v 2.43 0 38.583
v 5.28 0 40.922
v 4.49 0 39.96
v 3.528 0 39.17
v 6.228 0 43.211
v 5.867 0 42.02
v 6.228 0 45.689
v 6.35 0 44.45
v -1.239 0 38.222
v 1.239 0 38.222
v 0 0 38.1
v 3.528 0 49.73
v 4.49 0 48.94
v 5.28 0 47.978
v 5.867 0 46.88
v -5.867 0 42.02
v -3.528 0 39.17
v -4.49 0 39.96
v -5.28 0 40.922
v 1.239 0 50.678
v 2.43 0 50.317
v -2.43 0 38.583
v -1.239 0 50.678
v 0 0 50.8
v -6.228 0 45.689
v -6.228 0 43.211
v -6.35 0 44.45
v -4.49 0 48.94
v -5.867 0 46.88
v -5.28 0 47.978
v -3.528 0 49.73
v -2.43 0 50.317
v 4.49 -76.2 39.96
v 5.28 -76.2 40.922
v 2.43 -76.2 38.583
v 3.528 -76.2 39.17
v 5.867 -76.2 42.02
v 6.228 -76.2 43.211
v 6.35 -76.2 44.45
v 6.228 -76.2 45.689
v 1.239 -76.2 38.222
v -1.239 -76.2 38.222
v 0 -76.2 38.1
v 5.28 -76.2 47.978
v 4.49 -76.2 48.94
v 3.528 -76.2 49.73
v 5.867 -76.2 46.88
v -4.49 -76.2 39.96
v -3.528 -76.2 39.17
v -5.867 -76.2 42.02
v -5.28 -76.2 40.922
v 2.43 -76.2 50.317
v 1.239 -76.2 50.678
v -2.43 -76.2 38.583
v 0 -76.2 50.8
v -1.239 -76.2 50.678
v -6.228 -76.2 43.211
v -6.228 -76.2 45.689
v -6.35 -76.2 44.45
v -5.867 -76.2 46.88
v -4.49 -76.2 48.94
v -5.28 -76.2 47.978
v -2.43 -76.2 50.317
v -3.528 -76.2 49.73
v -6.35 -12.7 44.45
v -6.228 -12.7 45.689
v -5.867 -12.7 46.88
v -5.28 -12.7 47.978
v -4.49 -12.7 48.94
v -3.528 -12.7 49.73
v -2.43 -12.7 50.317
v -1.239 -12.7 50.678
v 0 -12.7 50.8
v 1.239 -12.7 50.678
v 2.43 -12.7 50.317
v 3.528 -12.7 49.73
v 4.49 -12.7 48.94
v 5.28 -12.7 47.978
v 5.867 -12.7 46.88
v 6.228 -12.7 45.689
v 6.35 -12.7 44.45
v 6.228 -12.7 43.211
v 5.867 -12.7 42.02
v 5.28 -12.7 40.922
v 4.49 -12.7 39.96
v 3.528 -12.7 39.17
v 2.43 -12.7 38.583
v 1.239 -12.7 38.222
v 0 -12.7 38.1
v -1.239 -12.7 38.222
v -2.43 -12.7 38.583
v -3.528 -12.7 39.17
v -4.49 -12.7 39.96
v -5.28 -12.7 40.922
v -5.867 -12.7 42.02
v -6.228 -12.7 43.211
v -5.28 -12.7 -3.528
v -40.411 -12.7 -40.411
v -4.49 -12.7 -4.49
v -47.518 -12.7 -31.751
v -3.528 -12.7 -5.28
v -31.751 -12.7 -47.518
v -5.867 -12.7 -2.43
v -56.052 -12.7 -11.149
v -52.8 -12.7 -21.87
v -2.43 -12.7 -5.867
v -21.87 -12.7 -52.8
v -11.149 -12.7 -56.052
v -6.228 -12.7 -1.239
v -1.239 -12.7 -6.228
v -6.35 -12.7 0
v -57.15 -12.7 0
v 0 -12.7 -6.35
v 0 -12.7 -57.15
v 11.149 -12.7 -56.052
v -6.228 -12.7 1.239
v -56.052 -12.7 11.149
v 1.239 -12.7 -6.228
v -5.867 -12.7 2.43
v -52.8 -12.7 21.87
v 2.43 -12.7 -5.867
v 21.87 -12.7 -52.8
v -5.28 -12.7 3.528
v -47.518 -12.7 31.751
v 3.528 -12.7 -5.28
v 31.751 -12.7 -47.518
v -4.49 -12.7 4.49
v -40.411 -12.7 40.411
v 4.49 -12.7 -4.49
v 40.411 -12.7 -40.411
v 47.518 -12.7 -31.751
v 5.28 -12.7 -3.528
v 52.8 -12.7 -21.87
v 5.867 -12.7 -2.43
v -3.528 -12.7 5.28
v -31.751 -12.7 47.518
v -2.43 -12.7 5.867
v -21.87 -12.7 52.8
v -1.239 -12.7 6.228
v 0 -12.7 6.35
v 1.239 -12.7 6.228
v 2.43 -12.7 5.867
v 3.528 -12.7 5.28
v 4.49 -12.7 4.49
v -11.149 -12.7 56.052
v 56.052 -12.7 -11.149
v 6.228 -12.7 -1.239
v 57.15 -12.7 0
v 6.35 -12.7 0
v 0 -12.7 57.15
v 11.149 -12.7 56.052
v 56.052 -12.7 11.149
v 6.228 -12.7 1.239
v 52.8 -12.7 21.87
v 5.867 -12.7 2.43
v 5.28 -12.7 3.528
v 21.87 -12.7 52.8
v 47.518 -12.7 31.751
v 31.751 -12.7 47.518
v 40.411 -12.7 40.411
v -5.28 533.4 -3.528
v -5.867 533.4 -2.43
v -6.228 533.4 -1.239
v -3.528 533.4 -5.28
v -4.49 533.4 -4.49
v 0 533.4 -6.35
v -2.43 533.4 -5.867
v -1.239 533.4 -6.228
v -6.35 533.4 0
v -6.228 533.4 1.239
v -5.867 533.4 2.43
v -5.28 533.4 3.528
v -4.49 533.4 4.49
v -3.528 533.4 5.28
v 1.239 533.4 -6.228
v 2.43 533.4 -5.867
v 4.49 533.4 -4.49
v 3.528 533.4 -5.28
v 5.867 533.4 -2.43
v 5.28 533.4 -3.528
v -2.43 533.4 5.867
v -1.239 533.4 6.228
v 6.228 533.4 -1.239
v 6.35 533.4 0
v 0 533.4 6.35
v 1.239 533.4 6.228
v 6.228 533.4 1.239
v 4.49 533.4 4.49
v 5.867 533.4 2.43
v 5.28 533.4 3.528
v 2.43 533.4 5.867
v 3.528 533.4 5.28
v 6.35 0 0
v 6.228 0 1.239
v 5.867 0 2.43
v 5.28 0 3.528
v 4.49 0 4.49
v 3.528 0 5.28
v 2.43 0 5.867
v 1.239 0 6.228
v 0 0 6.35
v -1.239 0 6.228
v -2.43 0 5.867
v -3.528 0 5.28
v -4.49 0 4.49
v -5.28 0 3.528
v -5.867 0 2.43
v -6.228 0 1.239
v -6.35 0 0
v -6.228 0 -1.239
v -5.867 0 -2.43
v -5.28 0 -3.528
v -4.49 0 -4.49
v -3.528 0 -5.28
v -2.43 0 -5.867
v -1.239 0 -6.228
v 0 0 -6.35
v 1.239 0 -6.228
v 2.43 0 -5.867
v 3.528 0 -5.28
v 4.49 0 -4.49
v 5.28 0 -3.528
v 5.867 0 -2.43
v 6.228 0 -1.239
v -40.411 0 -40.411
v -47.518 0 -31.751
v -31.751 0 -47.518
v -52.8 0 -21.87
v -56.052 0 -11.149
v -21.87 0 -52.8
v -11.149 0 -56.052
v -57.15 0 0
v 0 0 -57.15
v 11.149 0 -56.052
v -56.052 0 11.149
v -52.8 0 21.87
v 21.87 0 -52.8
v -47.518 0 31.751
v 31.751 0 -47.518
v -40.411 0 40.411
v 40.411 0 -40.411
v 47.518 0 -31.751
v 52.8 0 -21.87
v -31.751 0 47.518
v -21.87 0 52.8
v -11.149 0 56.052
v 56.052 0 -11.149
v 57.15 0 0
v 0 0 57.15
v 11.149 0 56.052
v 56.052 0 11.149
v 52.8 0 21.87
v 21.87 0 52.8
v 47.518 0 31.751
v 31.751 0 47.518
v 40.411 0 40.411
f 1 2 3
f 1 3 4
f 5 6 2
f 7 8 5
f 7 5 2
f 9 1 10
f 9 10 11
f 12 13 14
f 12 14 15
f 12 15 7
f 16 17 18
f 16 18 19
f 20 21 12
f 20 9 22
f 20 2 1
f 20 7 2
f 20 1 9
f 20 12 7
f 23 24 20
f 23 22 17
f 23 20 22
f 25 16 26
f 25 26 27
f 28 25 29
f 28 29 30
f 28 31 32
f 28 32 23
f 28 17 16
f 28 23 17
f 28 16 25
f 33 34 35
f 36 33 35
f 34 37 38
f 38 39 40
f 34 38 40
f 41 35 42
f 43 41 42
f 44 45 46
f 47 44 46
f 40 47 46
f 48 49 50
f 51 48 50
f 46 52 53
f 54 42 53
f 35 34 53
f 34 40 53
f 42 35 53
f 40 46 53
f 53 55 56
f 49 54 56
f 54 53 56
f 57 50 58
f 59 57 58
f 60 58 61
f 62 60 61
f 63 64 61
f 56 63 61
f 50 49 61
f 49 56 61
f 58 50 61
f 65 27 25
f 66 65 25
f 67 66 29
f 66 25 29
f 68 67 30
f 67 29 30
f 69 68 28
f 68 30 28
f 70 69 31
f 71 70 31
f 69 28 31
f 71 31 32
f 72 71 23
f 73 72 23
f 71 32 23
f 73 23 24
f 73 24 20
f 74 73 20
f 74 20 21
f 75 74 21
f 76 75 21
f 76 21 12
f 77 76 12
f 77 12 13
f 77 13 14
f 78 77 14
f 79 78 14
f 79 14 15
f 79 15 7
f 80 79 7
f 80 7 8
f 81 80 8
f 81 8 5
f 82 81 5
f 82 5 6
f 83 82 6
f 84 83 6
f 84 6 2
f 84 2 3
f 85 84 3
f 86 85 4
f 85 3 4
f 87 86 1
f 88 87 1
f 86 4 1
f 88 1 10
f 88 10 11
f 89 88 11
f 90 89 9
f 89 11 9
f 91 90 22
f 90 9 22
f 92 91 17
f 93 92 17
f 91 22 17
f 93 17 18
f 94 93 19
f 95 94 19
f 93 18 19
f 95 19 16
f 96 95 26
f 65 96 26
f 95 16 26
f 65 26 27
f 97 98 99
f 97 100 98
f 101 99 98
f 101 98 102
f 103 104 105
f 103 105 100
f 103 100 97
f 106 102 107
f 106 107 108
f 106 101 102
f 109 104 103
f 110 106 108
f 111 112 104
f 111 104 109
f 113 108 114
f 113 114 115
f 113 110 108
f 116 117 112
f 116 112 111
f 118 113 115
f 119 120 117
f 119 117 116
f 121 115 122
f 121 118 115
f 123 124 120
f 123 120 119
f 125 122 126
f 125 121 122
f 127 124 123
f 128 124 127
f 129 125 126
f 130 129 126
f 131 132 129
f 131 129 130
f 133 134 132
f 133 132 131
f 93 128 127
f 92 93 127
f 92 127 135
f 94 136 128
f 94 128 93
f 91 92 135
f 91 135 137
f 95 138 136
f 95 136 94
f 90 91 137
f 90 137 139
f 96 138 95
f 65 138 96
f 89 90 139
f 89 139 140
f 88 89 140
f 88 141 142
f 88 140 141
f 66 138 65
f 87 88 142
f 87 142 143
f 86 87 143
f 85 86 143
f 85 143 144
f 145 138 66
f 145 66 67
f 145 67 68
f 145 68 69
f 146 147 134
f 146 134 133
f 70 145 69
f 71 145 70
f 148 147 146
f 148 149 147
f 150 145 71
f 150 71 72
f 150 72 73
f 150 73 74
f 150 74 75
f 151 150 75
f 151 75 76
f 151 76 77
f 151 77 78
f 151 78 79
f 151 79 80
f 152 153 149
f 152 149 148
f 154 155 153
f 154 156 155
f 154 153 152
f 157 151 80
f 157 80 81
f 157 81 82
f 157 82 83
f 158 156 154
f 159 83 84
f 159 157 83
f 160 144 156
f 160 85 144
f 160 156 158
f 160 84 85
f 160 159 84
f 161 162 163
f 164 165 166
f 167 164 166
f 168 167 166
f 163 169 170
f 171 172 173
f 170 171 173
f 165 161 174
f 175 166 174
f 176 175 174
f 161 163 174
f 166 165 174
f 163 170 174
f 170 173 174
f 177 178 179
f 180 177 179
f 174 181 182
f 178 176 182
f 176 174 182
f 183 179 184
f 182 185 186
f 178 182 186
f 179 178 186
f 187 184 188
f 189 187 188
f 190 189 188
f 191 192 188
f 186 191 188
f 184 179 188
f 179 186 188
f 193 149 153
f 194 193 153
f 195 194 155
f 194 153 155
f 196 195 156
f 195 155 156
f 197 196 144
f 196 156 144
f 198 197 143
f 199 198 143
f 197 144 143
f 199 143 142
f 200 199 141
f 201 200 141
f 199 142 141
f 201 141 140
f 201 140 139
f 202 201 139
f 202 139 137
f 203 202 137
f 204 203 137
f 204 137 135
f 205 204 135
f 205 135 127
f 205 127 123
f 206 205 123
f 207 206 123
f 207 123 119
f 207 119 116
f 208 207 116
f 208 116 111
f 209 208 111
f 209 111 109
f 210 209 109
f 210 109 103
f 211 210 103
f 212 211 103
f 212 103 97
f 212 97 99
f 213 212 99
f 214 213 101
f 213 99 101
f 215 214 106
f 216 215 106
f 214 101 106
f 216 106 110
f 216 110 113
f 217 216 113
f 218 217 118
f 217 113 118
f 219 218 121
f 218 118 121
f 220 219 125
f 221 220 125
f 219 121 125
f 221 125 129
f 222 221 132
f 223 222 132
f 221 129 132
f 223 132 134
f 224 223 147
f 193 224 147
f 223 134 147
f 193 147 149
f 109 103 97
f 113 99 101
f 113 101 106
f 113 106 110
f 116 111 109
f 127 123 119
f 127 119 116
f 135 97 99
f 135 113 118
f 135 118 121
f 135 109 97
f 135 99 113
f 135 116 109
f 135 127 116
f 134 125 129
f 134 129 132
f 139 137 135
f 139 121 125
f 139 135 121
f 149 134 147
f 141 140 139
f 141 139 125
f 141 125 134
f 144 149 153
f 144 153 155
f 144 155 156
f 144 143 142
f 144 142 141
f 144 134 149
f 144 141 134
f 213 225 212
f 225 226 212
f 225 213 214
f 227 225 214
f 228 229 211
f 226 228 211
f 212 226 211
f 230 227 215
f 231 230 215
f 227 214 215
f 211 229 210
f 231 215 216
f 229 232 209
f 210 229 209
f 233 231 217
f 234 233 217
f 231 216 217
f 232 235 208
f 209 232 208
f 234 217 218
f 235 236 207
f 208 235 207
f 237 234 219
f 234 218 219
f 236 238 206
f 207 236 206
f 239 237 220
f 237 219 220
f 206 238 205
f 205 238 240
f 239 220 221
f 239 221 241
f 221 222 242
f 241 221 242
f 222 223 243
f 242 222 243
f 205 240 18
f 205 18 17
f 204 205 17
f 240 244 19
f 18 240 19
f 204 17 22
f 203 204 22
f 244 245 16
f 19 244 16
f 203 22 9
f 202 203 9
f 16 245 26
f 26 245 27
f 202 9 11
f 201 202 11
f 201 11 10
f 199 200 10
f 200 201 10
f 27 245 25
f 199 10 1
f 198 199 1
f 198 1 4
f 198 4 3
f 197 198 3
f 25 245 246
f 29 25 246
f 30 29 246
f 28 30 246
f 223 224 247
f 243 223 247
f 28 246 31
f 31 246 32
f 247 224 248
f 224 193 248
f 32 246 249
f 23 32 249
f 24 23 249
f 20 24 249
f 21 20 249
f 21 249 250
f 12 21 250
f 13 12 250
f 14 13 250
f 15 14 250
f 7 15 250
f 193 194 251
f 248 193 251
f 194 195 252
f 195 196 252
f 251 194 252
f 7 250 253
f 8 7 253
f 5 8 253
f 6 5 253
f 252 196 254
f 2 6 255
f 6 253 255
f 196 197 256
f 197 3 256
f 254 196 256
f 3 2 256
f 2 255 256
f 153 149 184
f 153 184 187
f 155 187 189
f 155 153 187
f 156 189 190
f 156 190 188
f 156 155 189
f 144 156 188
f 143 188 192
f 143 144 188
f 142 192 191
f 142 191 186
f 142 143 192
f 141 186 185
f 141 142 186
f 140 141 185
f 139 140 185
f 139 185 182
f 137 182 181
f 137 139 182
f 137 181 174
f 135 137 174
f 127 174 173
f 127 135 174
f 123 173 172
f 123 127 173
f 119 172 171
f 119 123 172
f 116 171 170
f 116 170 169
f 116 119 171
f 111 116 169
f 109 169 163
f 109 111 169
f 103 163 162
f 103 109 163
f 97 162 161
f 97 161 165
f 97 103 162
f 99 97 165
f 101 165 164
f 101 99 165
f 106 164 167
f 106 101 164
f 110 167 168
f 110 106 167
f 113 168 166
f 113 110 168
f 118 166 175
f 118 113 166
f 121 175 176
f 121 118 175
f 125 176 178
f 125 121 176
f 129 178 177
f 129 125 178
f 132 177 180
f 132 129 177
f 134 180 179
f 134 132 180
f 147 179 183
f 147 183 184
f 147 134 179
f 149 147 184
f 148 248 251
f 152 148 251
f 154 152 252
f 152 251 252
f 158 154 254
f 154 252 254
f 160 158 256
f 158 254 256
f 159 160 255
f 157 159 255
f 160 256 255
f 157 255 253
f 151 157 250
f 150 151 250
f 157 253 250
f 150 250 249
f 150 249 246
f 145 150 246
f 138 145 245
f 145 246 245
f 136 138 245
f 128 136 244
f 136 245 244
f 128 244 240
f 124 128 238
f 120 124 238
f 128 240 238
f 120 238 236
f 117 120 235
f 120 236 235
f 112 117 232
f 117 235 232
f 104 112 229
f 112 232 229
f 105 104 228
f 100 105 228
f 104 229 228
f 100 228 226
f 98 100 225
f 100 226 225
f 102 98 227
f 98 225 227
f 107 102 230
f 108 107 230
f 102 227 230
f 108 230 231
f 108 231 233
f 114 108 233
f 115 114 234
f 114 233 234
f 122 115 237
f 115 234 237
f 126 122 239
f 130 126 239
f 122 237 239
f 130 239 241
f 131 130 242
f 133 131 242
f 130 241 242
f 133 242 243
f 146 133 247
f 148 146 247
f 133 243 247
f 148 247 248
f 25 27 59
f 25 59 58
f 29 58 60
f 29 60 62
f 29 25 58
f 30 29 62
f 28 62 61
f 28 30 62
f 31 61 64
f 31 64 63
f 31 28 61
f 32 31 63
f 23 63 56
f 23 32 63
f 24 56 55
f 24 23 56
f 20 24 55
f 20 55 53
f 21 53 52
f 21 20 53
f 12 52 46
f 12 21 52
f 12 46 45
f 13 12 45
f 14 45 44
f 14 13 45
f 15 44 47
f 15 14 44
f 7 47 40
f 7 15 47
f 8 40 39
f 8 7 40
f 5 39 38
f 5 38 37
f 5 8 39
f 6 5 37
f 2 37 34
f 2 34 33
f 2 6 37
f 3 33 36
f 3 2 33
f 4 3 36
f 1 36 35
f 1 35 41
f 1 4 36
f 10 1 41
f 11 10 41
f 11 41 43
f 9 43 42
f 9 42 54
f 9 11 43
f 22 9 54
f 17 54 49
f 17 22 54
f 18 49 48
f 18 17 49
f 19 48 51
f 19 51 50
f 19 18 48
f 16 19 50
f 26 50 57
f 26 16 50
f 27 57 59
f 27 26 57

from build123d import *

# Parameters (mm, degrees)
F0_R     = 57.15
F1_DEPTH = 12.7
F2_R     = 6.35
F3_DEPTH = 12.701
F4_R     = 6.35
F5_DEPTH = 546.1
F6_R     = 6.35
F7_DEPTH = 12.701
F8_DEPTH = 76.2


with BuildPart() as f1:
    # F0 (on Front) → F1 (new body)
    with BuildSketch(Plane.XZ):
        Circle(F0_R)
    extrude(amount=F1_DEPTH)

    # F2 (on face) → F3 (cut, through all)
    with BuildSketch(Plane.XZ.offset(12.7)):
        Circle(F2_R)
    extrude(amount=-F3_DEPTH, mode=Mode.SUBTRACT)

    # F6 (on face) → F7 (cut, through all)
    with BuildSketch(Plane(origin=(0, 0, 0), x_dir=(-1, 0, 0), z_dir=(0, 1, 0))):
        with Locations((0, 44.45)):
            Circle(F6_R)
    extrude(amount=-F7_DEPTH, mode=Mode.SUBTRACT)


with BuildPart() as f5:
    # F4 (on face) → F5 (new body)
    with BuildSketch(Plane.XZ.offset(12.7)):
        Circle(F4_R)
    extrude(amount=-F5_DEPTH)


with BuildPart() as f8:
    # F6 (on face) → F8 (new body)
    with BuildSketch(Plane(origin=(0, 0, 0), x_dir=(-1, 0, 0), z_dir=(0, 1, 0))):
        with Locations((0, 44.45)):
            Circle(F6_R)
    extrude(amount=-F8_DEPTH)


solid = Compound([f1.part, f5.part, f8.part])
